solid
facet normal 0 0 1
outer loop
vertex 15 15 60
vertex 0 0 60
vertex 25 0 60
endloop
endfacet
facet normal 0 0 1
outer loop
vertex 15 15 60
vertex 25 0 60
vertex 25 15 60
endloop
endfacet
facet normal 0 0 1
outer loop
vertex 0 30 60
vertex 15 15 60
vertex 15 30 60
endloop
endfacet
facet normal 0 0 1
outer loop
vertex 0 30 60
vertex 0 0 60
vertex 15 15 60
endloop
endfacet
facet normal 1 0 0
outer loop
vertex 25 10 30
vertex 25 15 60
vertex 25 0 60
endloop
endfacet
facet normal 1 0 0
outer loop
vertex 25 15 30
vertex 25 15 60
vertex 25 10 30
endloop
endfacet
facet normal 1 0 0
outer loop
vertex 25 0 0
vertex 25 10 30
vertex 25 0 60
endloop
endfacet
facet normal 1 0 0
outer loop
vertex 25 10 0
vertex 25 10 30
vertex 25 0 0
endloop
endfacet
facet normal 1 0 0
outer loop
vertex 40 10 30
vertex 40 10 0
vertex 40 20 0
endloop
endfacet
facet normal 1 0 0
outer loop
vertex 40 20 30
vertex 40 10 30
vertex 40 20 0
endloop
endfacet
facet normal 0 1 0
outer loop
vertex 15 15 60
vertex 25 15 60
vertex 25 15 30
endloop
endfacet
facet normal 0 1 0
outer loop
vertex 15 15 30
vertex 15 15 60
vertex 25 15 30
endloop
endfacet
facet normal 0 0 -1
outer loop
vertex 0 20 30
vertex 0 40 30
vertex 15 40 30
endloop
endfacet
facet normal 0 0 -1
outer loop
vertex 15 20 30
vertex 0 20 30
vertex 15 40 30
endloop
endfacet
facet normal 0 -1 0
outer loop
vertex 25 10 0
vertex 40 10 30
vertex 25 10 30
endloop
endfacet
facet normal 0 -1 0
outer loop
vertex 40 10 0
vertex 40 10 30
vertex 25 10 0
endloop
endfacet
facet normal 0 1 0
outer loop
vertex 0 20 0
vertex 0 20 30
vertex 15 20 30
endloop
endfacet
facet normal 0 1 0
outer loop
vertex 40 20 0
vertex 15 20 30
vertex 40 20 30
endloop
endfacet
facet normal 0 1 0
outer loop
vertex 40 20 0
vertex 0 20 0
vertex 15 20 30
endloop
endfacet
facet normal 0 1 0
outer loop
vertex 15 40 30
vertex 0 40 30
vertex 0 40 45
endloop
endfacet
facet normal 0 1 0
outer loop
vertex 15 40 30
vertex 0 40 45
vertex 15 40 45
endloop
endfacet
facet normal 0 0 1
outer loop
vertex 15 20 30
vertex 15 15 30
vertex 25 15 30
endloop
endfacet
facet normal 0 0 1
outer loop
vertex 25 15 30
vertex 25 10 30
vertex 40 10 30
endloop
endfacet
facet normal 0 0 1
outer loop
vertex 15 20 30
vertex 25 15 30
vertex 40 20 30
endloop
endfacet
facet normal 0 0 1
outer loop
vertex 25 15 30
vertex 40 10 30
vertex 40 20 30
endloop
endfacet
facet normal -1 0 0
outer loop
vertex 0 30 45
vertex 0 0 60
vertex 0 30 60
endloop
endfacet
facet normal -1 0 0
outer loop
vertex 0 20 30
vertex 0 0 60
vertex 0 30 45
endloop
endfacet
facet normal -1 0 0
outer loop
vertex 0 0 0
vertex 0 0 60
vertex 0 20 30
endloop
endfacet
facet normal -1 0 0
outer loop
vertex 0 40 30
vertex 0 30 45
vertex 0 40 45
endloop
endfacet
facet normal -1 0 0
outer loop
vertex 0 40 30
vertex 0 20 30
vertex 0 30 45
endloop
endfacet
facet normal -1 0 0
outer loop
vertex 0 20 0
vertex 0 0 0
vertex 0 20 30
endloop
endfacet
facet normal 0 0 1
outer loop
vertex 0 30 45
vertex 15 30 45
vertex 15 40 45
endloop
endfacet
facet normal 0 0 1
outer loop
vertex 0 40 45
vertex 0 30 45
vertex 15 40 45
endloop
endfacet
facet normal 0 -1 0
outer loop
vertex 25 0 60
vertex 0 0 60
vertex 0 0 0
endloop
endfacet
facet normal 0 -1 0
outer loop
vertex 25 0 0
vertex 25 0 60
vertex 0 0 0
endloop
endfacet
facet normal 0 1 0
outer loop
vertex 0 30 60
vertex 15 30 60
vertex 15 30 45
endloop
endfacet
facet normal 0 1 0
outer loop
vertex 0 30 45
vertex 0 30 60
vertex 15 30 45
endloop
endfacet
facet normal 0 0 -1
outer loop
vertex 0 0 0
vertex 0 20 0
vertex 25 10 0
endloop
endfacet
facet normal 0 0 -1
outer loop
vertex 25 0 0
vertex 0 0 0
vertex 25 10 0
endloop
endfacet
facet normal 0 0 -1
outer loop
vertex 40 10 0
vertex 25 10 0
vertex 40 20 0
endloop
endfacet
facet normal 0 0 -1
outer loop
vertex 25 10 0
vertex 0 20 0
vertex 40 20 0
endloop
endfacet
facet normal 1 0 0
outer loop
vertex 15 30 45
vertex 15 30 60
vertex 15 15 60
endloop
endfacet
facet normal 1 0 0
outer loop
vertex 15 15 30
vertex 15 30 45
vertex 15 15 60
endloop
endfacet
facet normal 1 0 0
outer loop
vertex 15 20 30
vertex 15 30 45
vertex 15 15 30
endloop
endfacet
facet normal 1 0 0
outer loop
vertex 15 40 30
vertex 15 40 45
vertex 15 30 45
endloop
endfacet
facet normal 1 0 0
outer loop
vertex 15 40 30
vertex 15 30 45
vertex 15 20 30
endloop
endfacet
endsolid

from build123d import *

# Parameters (mm, degrees)
SKETCH1_W           = 40
SKETCH1_H           = 40
BOSS_EXTRUDE1_DEPTH = 60
SKETCH2_W           = 20
SKETCH2_H           = 40
CUT_EXTRUDE1_DEPTH  = 30
SKETCH4_W           = 40
SKETCH4_H           = 30
CUT_EXTRUDE2_DEPTH  = 20
SKETCH5_W           = 30
SKETCH5_H           = 10
CUT_EXTRUDE3_DEPTH  = 15
SKETCH6_W           = 15
SKETCH6_H           = 10
CUT_EXTRUDE4_DEPTH  = 25
SKETCH8_W           = 30
SKETCH8_H           = 15
BOSS_EXTRUDE2_DEPTH = 10
SKETCH10_W          = 30
SKETCH10_H          = 25
CUT_EXTRUDE5_DEPTH  = 5
SKETCH11_W          = 30
SKETCH11_H          = 15
CUT_EXTRUDE6_DEPTH  = 5


with BuildPart() as part:
    # Sketch1 → Boss-Extrude1 (new body)
    with BuildSketch(Plane.XY):
        with Locations((20, 20)):
            Rectangle(SKETCH1_W, SKETCH1_H)
    extrude(amount=BOSS_EXTRUDE1_DEPTH)

    # Sketch2 → Cut-Extrude1 (cut)
    with BuildSketch(Plane.XY.offset(60)):
        with Locations((30, 20)):
            Rectangle(SKETCH2_W, SKETCH2_H)
    extrude(amount=-CUT_EXTRUDE1_DEPTH, mode=Mode.SUBTRACT)

    # Sketch4 → Cut-Extrude2 (cut)
    with BuildSketch(Plane(origin=(0, 40, 0), x_dir=(1, 0, 0), z_dir=(0, 1, 0))):
        with Locations((20, -15)):
            Rectangle(SKETCH4_W, SKETCH4_H)
    extrude(amount=-CUT_EXTRUDE2_DEPTH, mode=Mode.SUBTRACT)

    # Sketch5 → Cut-Extrude3 (cut)
    with BuildSketch(Plane(origin=(40, 0, 0), x_dir=(0, 0, -1), z_dir=(1, 0, 0))):
        with Locations((-15, 5)):
            Rectangle(SKETCH5_W, SKETCH5_H)
    extrude(amount=-CUT_EXTRUDE3_DEPTH, mode=Mode.SUBTRACT)

    # Sketch6 → Cut-Extrude4 (cut)
    with BuildSketch(Plane(origin=(20, 0, 0), x_dir=(0, 0, -1), z_dir=(1, 0, 0))):
        with Locations((-52.5, 35)):
            Rectangle(SKETCH6_W, SKETCH6_H)
    extrude(amount=-CUT_EXTRUDE4_DEPTH, mode=Mode.SUBTRACT)

    # Sketch8 → Boss-Extrude2 (add)
    with BuildSketch(Plane(origin=(20, 0, 0), x_dir=(0, 0, -1), z_dir=(1, 0, 0))):
        with Locations((-45, 7.5)):
            Rectangle(SKETCH8_W, SKETCH8_H)
    extrude(amount=BOSS_EXTRUDE2_DEPTH)

    # Sketch10 → Cut-Extrude5 (cut)
    with BuildSketch(Plane(origin=(20, 0, 0), x_dir=(0, 0, -1), z_dir=(1, 0, 0))):
        with Locations((-45, 27.5)):
            Rectangle(SKETCH10_W, SKETCH10_H)
    extrude(amount=-CUT_EXTRUDE5_DEPTH, mode=Mode.SUBTRACT)

    # Sketch11 → Cut-Extrude6 (cut)
    with BuildSketch(Plane(origin=(30, 0, 0), x_dir=(0, 0, -1), z_dir=(1, 0, 0))):
        with Locations((-45, 7.5)):
            Rectangle(SKETCH11_W, SKETCH11_H)
    extrude(amount=-CUT_EXTRUDE6_DEPTH, mode=Mode.SUBTRACT)


solid = part.part
